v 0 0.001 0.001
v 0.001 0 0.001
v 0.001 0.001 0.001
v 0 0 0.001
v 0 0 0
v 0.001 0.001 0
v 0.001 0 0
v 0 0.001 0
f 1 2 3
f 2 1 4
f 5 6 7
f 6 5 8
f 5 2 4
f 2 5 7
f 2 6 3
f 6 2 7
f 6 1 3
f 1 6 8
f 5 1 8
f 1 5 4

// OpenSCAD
// t_split — the C-section. A split tube is a PROFILE, not a path feature, and
// the seam is a FRAME POLICY. Between them they replace ~300 lines of
// reference/axford/half_curvedPipe.scad and its hard nine-segment ceiling.

use <../src/uniTube.scad>;

$fa = 6;
$fs = 0.5;

prof = ut_round(od = 16, wall = 2, split = [ -30, 30 ]);
N = len(ut_prof_outer(prof));

// --- the profile is OPEN ------------------------------------------------------
assert(ut_prof_open(prof), "a split profile is open");
assert(ut_prof_hollow(prof), "it still has an inner surface");
assert(len(ut_bore_rgn(prof)) == 0, "but NO enclosed lumen -- it cannot join to anything");
assert(len(ut_shell_rgn(prof)) == 0, "and no meaningful shell region either");
assert(len(ut_solid_rgn(prof)) == 2, "the finished wall is still outer + inner");
assert(ut_prof_symmetry(prof) == 1, "a split section has 1-fold symmetry, which matters for closed-loop holonomy");

// --- the gap is where it was asked for ---------------------------------------
o = ut_prof_outer(prof);
first = atan2(o[0][1], o[0][0]);
last = atan2(o[N - 1][1], o[N - 1][0]);
assert(abs(first - 30) < 1e-9, str("material starts at the far edge of the gap, got ", first));
assert(abs(last - (-30)) < 1e-9, str("material ends at the near edge of the gap, got ", last));
// The gap is centred on profile-local +X, which IS the station's roll reference.
// That is what makes "the seam faces up" mean something.
assert(abs(norm(o[0]) - 8) < 1e-9 && abs(norm(o[N - 1]) - 8) < 1e-9, "outer edge sits at od/2");

// --- PROF-2 still holds across the open span ---------------------------------
i = ut_prof_inner(prof);
assert(len(i) == N, "PROF-2: equal point count");
assert(max([for (k = [0:N - 1]) abs(atan2(o[k][1], o[k][0]) - atan2(i[k][1], i[k][0]))]) < 1e-6,
       "PROF-2: angle-aligned index-for-index across the material span");

// --- a STRAIGHT run: volume is exactly area x length, no Pappus correction ----
L = 60;
straight = ut_polyline([ [ 0, 0, 0 ], [ L, 0, 0 ] ]);
seg_area = (N - 1) * 0.5 * (8 * 8 - 6 * 6) * sin(300 / (N - 1));
vol = ut_run_volume(straight, prof);
assert(abs(vol - seg_area * L) / (seg_area * L) < 1e-6,
       str("straight C-section volume ", vol, " must be exactly area*length ", seg_area *L));

// --- the mesh is CLOSED: two seam walls are added, and they are not optional --
sts = ut_stations(straight);
S = len(sts);
fcs = ut_mesh_faces(ut_solid_rgn(prof), sts, false, true);
// skins: 2 * (S-1) * (N-1) quads; caps: 2 * (N-1) quads; seam walls: 2 * (S-1) quads
expect_quads = 2 * (S - 1) * (N - 1) + 2 * (N - 1) + 2 * (S - 1);
assert(len(fcs) == expect_quads * 2, str("open-annulus face count: expected ", expect_quads * 2, " got ", len(fcs)));
assert(min([for (f = fcs) len(f)]) == 3, "every face is a triangle");

// --- the seam does not spiral over bends in DIFFERENT planes -----------------
// This is the exit criterion, and the case half_curvedPipe.scad was built for.
//
// The final leg CLIMBS AT 37 DEGREES rather than running straight up, and that
// matters. This test used to finish vertical and then assert only that the
// frame was not NaN there. It is not NaN -- ut_ref_fallback swaps UP for BACK --
// but that swap is a discontinuity, and the seam jumped 174 degrees in one
// 6-degree step while this assert passed. "Not NaN" was never the requirement;
// continuity is, and STATION-6 now enforces it in ut_stations().
bendy = ut_polyline([ [ 0, 0, 0 ], [ 60, 0, 0 ], [ 60, 40, 0 ], [ 100, 40, 30 ] ], r = 18);
fx = ut_stations(bendy, [ [ "frame", "fixed" ], [ "normal", [ 0, 0, 1 ] ] ]);
horiz = [for (s = fx) if (abs(ut_st_t(s)[2]) < 1e-9) s];
assert(len(horiz) > 4, "expected many horizontal stations across two bends");
assert(max([for (s = horiz) norm(ut_st_n(s) - [ 0, 0, 1 ])]) < 1e-9,
       "the gap must face EXACTLY world-up on every horizontal station -- no spiral");
// The seam is continuous across BOTH bends, including the one that climbs.
assert(max([for (i = [1:len(fx) - 1]) ut_turn(ut_st_n(fx[i]), ut_st_n(fx[i - 1])) -
            ut_turn(ut_st_t(fx[i]), ut_st_t(fx[i - 1]))]) < 1e-9,
       "STATION-6: the seam never outruns the axis, so a C-section stays a C-section");
// Every frame is real. Counting is the only way to see this -- max() drops nan.
assert(len([for (s = fx) if (!is_num(ut_st_n(s)[0]) || !is_num(ut_st_n(s)[1]) || !is_num(ut_st_n(s)[2])) 1]) == 0,
       "no station frame may contain nan");

cube(0.001); // sentinel
